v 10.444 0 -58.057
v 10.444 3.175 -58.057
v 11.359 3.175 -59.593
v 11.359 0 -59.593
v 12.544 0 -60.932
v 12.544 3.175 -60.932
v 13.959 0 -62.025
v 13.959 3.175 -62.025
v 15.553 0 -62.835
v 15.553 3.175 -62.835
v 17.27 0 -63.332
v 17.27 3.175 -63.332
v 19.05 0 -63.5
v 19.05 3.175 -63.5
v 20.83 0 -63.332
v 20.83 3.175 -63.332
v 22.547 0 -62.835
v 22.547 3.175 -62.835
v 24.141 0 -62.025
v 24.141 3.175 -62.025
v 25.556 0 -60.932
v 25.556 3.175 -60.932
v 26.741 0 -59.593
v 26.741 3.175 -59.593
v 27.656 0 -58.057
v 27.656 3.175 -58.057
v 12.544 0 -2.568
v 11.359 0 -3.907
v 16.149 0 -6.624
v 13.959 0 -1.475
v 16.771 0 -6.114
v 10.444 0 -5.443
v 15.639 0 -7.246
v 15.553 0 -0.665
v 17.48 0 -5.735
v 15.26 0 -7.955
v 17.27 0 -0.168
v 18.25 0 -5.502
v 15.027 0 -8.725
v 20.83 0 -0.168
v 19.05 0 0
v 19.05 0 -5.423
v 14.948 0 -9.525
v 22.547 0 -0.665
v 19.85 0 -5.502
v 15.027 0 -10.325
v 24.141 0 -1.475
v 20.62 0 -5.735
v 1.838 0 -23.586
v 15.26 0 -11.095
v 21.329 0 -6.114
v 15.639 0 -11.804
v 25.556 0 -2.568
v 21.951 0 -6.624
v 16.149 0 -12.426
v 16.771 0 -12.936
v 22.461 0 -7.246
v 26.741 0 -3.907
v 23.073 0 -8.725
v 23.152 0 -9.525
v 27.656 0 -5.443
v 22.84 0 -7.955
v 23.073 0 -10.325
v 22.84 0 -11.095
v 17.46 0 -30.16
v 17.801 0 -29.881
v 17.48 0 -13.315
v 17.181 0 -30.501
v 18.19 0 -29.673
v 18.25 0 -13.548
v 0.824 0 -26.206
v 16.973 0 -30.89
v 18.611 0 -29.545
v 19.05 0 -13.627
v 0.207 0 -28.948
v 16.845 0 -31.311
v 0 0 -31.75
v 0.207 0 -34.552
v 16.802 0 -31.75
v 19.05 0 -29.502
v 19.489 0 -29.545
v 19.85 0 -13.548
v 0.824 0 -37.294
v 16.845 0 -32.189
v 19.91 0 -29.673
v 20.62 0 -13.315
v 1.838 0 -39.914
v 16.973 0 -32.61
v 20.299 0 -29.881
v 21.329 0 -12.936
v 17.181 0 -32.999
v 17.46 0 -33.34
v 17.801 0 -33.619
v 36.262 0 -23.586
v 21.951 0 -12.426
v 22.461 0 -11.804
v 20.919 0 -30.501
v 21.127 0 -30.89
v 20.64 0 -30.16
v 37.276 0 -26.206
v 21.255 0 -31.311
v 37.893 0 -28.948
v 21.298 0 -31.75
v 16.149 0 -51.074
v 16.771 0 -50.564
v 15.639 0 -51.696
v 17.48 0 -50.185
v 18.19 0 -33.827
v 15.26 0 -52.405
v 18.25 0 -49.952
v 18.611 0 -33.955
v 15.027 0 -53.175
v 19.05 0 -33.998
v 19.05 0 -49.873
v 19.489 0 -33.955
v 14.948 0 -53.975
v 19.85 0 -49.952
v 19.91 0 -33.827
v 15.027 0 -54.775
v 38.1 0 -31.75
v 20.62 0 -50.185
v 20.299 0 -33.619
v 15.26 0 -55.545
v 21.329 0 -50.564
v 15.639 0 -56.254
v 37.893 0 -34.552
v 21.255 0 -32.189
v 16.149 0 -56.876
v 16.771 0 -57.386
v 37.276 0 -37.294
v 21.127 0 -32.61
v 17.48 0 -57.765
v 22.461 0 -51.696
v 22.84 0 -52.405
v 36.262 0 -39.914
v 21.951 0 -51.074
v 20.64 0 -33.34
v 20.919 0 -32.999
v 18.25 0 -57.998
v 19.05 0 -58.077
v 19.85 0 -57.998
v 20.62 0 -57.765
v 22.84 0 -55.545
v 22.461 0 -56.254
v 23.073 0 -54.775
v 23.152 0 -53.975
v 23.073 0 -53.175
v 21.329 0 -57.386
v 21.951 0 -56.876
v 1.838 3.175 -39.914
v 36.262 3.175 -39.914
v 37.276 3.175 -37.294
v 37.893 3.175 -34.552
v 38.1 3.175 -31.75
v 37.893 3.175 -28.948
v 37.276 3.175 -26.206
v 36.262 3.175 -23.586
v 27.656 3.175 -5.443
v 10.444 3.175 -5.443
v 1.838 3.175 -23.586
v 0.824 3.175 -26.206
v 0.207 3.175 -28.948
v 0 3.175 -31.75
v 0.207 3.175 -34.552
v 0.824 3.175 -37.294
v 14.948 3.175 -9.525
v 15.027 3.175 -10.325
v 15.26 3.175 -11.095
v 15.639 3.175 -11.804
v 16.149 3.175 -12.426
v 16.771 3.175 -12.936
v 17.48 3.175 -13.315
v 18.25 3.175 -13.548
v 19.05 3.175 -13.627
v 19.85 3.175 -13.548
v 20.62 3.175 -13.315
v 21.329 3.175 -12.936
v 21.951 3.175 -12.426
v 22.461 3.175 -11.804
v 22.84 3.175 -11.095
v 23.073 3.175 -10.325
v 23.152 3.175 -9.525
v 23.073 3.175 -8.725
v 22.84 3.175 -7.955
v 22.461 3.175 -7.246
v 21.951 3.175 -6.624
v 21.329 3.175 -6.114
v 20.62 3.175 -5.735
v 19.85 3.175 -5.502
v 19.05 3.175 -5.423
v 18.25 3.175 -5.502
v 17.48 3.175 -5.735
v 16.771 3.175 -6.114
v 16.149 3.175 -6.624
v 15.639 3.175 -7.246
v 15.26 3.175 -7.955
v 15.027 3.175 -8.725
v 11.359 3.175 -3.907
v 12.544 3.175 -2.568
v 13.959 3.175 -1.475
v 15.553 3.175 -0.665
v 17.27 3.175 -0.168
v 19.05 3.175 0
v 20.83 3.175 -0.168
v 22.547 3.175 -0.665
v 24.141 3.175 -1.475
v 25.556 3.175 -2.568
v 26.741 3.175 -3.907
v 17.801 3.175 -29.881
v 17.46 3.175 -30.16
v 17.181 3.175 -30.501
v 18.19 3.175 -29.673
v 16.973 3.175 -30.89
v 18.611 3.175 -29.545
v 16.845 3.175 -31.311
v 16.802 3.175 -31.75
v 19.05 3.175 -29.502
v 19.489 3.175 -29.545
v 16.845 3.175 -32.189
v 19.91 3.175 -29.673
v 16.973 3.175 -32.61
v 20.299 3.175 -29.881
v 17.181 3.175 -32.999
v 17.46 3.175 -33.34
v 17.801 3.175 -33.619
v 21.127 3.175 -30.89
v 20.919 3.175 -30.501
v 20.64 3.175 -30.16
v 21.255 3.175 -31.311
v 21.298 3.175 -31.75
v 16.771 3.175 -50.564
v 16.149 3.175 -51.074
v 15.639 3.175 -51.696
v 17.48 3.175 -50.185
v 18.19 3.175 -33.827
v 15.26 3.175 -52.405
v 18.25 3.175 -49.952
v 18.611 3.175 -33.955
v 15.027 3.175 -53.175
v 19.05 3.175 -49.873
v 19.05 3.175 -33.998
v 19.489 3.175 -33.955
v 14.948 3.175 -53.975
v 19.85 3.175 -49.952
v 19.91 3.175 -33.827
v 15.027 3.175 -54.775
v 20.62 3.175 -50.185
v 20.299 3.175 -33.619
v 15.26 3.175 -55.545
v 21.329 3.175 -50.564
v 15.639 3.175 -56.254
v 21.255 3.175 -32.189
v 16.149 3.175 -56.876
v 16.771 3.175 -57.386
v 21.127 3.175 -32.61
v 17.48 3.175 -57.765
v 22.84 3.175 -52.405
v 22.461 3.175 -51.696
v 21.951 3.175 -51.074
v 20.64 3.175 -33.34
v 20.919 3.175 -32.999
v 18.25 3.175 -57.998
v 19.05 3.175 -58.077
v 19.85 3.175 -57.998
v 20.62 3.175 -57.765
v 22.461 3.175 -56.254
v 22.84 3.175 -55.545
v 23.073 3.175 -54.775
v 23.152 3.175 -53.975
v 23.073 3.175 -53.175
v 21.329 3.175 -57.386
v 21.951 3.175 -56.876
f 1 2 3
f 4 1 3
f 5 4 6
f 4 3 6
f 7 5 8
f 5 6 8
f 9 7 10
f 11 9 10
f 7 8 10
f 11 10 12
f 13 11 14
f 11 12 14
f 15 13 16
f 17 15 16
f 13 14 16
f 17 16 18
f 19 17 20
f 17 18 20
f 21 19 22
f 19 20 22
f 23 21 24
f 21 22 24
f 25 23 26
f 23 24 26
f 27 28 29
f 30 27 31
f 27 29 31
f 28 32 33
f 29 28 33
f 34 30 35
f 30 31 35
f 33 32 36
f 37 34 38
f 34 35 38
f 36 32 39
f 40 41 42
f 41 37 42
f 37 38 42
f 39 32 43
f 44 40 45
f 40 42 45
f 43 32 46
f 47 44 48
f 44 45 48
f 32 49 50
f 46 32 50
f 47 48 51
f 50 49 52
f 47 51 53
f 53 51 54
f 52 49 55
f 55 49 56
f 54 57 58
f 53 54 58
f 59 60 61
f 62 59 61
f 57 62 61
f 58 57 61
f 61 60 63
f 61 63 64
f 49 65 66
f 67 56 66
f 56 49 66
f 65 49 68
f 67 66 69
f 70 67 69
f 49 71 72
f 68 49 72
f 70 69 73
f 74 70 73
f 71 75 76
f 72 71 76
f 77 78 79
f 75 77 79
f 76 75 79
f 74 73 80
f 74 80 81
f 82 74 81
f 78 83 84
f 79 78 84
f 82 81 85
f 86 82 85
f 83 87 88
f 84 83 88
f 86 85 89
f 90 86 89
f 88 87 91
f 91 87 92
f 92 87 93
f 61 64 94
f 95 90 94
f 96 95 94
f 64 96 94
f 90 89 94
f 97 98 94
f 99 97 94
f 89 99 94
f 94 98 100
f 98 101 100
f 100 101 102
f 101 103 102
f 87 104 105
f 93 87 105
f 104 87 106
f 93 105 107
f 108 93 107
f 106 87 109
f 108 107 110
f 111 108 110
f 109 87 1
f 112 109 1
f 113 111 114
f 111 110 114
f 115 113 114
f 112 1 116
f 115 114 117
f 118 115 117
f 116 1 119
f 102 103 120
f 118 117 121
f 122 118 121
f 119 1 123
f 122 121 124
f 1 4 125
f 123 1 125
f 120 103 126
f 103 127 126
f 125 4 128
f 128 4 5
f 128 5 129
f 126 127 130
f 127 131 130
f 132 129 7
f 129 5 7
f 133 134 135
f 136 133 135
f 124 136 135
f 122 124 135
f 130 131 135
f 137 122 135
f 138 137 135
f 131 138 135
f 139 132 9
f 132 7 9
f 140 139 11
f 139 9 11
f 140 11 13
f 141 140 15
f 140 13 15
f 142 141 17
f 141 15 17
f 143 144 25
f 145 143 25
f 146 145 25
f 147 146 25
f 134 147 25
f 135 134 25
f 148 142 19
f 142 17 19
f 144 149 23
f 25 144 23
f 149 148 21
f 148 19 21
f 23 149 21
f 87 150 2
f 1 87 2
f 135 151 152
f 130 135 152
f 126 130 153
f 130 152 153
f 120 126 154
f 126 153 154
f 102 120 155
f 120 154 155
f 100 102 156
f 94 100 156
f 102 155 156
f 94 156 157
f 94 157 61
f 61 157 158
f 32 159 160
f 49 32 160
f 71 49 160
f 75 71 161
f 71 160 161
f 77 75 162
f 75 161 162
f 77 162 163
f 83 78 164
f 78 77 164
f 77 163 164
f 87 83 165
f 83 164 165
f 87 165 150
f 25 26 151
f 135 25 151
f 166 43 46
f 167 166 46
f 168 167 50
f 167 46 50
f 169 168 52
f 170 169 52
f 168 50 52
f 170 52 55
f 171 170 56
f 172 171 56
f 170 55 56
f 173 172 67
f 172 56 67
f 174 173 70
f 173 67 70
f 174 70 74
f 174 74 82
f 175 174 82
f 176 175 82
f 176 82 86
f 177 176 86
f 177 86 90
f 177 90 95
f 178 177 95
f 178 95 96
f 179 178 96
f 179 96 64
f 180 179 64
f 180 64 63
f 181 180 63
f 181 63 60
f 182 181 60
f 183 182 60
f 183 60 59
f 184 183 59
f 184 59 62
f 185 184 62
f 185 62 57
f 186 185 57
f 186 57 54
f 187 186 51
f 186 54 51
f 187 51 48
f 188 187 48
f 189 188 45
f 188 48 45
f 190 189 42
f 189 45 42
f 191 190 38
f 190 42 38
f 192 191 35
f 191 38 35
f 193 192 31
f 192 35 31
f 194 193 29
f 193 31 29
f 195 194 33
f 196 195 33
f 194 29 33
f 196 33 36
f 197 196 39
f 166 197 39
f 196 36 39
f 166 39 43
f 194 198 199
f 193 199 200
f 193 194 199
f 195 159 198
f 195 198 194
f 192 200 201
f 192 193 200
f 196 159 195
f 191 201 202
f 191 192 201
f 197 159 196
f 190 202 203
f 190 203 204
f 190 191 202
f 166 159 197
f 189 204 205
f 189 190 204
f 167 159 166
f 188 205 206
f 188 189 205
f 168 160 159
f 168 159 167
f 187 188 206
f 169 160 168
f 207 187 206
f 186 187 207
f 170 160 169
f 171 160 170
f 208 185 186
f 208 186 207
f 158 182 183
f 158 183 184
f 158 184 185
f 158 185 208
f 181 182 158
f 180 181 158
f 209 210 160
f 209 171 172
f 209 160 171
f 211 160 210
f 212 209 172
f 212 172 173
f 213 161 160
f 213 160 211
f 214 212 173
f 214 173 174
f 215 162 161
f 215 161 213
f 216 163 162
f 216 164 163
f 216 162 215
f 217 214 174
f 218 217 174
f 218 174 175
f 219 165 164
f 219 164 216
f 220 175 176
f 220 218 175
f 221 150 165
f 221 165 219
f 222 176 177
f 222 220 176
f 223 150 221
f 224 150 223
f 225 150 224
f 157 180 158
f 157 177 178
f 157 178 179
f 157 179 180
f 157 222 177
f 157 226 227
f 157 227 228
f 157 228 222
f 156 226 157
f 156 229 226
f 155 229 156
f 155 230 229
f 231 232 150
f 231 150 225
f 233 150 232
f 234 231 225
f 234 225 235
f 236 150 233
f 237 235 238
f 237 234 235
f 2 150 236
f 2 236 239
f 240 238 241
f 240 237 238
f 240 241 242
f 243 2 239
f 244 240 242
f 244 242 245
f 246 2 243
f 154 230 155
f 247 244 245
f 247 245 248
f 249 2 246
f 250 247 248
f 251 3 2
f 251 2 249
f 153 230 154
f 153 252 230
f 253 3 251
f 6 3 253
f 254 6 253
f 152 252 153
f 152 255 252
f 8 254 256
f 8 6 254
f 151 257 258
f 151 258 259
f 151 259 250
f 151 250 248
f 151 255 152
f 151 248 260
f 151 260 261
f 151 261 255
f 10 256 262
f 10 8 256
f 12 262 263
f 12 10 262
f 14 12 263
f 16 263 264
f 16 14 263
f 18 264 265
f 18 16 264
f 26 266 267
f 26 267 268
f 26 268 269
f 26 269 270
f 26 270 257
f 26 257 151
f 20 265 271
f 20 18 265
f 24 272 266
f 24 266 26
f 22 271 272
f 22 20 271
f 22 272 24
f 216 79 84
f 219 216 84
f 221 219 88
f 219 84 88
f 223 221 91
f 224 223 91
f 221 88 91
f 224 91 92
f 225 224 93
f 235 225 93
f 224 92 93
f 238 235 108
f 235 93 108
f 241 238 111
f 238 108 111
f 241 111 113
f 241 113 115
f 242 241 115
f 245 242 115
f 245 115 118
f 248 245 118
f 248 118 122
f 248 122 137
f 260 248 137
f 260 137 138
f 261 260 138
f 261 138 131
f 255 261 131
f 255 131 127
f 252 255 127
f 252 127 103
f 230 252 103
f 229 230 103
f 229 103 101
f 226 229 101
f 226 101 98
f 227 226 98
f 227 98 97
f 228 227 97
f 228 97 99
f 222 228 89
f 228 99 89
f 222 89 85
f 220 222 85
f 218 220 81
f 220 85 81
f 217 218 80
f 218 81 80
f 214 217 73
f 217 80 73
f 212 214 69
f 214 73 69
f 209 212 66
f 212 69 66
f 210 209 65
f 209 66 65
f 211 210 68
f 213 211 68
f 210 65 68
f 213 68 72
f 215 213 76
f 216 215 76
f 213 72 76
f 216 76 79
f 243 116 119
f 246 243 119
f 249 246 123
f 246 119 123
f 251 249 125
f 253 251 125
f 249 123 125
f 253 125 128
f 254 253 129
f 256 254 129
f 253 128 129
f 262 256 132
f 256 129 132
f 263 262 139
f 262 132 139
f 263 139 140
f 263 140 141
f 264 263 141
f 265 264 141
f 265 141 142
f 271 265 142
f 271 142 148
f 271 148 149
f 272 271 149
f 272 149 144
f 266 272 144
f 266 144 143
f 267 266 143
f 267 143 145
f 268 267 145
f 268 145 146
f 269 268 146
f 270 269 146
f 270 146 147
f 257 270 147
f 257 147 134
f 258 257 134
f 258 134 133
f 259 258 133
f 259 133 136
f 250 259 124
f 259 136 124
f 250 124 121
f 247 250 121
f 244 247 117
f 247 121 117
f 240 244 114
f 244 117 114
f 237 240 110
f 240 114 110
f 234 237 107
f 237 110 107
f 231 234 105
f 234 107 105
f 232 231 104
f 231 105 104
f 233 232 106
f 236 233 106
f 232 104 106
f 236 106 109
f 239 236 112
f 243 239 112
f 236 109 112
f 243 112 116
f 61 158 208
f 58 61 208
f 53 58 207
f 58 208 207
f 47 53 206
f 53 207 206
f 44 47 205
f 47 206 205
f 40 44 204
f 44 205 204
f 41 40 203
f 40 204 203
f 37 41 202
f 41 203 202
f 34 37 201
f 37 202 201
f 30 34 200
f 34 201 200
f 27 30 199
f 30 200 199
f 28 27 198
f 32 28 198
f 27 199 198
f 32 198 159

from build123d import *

# Parameters (mm, degrees)
SKETCH1_W                = 38.1
SKETCH1_H                = 63.5
BOSS_EXTRUDE1_DEPTH      = 3.175
F_8_CLEARANCE_HOLE1_D    = 4.4958
F_5_16_CLEARANCE_HOLE1_D = 8.2042
SKETCH6_W                = 40.64
SKETCH6_H                = 66.04
CUT_EXTRUDE1_DEPTH       = 3.175


with BuildPart() as part:
    # Sketch1 → Boss-Extrude1 (new body)
    with BuildSketch(Plane(origin=(0, 0, 0), x_dir=(1, 0, 0), z_dir=(0, 1, 0))):
        with Locations((19.05, 31.75)):
            Rectangle(SKETCH1_W, SKETCH1_H)
    extrude(amount=BOSS_EXTRUDE1_DEPTH)

    # #8 Clearance Hole1 (through all)
    with Locations(Plane(origin=(0, 3.175, 0), x_dir=(1, 0, 0), z_dir=(0, 1, 0))):
        with Locations((19.05, 31.75)):
            Hole(F_8_CLEARANCE_HOLE1_D / 2)

    # 5/16 Clearance Hole1 (through all)
    with Locations(Plane(origin=(0, 3.175, 0), x_dir=(1, 0, 0), z_dir=(0, 1, 0))):
        with Locations((19.05, 9.525), (19.05, 53.975)):
            Hole(F_5_16_CLEARANCE_HOLE1_D / 2)

    # Sketch6 → Cut-Extrude1 (cut)
    with BuildSketch(Plane(origin=(0, 3.175, 0), x_dir=(1, 0, 0), z_dir=(0, 1, 0))):
        with Locations((19.05, 31.75)):
            Rectangle(SKETCH6_W, SKETCH6_H)
        with BuildLine():
            Line((27.655912775, 58.057142857), (36.26182555, 39.914285714))
            ThreePointArc((36.26182555, 39.914285714), (38.1, 31.75), (36.26182555, 23.585714286))
            Line((36.26182555, 23.585714286), (27.655912775, 5.442857143))
            ThreePointArc((27.655912775, 5.442857143), (19.05, 0), (10.444087225, 5.442857143))
            Line((10.444087225, 5.442857143), (1.83817445, 23.585714286))
            ThreePointArc((1.83817445, 23.585714286), (0, 31.75), (1.83817445, 39.914285714))
            Line((1.83817445, 39.914285714), (10.444087225, 58.057142857))
            ThreePointArc((10.444087225, 58.057142857), (19.05, 63.5), (27.655912775, 58.057142857))
        make_face(mode=Mode.SUBTRACT)
    extrude(amount=-CUT_EXTRUDE1_DEPTH, mode=Mode.SUBTRACT)


solid = part.part
